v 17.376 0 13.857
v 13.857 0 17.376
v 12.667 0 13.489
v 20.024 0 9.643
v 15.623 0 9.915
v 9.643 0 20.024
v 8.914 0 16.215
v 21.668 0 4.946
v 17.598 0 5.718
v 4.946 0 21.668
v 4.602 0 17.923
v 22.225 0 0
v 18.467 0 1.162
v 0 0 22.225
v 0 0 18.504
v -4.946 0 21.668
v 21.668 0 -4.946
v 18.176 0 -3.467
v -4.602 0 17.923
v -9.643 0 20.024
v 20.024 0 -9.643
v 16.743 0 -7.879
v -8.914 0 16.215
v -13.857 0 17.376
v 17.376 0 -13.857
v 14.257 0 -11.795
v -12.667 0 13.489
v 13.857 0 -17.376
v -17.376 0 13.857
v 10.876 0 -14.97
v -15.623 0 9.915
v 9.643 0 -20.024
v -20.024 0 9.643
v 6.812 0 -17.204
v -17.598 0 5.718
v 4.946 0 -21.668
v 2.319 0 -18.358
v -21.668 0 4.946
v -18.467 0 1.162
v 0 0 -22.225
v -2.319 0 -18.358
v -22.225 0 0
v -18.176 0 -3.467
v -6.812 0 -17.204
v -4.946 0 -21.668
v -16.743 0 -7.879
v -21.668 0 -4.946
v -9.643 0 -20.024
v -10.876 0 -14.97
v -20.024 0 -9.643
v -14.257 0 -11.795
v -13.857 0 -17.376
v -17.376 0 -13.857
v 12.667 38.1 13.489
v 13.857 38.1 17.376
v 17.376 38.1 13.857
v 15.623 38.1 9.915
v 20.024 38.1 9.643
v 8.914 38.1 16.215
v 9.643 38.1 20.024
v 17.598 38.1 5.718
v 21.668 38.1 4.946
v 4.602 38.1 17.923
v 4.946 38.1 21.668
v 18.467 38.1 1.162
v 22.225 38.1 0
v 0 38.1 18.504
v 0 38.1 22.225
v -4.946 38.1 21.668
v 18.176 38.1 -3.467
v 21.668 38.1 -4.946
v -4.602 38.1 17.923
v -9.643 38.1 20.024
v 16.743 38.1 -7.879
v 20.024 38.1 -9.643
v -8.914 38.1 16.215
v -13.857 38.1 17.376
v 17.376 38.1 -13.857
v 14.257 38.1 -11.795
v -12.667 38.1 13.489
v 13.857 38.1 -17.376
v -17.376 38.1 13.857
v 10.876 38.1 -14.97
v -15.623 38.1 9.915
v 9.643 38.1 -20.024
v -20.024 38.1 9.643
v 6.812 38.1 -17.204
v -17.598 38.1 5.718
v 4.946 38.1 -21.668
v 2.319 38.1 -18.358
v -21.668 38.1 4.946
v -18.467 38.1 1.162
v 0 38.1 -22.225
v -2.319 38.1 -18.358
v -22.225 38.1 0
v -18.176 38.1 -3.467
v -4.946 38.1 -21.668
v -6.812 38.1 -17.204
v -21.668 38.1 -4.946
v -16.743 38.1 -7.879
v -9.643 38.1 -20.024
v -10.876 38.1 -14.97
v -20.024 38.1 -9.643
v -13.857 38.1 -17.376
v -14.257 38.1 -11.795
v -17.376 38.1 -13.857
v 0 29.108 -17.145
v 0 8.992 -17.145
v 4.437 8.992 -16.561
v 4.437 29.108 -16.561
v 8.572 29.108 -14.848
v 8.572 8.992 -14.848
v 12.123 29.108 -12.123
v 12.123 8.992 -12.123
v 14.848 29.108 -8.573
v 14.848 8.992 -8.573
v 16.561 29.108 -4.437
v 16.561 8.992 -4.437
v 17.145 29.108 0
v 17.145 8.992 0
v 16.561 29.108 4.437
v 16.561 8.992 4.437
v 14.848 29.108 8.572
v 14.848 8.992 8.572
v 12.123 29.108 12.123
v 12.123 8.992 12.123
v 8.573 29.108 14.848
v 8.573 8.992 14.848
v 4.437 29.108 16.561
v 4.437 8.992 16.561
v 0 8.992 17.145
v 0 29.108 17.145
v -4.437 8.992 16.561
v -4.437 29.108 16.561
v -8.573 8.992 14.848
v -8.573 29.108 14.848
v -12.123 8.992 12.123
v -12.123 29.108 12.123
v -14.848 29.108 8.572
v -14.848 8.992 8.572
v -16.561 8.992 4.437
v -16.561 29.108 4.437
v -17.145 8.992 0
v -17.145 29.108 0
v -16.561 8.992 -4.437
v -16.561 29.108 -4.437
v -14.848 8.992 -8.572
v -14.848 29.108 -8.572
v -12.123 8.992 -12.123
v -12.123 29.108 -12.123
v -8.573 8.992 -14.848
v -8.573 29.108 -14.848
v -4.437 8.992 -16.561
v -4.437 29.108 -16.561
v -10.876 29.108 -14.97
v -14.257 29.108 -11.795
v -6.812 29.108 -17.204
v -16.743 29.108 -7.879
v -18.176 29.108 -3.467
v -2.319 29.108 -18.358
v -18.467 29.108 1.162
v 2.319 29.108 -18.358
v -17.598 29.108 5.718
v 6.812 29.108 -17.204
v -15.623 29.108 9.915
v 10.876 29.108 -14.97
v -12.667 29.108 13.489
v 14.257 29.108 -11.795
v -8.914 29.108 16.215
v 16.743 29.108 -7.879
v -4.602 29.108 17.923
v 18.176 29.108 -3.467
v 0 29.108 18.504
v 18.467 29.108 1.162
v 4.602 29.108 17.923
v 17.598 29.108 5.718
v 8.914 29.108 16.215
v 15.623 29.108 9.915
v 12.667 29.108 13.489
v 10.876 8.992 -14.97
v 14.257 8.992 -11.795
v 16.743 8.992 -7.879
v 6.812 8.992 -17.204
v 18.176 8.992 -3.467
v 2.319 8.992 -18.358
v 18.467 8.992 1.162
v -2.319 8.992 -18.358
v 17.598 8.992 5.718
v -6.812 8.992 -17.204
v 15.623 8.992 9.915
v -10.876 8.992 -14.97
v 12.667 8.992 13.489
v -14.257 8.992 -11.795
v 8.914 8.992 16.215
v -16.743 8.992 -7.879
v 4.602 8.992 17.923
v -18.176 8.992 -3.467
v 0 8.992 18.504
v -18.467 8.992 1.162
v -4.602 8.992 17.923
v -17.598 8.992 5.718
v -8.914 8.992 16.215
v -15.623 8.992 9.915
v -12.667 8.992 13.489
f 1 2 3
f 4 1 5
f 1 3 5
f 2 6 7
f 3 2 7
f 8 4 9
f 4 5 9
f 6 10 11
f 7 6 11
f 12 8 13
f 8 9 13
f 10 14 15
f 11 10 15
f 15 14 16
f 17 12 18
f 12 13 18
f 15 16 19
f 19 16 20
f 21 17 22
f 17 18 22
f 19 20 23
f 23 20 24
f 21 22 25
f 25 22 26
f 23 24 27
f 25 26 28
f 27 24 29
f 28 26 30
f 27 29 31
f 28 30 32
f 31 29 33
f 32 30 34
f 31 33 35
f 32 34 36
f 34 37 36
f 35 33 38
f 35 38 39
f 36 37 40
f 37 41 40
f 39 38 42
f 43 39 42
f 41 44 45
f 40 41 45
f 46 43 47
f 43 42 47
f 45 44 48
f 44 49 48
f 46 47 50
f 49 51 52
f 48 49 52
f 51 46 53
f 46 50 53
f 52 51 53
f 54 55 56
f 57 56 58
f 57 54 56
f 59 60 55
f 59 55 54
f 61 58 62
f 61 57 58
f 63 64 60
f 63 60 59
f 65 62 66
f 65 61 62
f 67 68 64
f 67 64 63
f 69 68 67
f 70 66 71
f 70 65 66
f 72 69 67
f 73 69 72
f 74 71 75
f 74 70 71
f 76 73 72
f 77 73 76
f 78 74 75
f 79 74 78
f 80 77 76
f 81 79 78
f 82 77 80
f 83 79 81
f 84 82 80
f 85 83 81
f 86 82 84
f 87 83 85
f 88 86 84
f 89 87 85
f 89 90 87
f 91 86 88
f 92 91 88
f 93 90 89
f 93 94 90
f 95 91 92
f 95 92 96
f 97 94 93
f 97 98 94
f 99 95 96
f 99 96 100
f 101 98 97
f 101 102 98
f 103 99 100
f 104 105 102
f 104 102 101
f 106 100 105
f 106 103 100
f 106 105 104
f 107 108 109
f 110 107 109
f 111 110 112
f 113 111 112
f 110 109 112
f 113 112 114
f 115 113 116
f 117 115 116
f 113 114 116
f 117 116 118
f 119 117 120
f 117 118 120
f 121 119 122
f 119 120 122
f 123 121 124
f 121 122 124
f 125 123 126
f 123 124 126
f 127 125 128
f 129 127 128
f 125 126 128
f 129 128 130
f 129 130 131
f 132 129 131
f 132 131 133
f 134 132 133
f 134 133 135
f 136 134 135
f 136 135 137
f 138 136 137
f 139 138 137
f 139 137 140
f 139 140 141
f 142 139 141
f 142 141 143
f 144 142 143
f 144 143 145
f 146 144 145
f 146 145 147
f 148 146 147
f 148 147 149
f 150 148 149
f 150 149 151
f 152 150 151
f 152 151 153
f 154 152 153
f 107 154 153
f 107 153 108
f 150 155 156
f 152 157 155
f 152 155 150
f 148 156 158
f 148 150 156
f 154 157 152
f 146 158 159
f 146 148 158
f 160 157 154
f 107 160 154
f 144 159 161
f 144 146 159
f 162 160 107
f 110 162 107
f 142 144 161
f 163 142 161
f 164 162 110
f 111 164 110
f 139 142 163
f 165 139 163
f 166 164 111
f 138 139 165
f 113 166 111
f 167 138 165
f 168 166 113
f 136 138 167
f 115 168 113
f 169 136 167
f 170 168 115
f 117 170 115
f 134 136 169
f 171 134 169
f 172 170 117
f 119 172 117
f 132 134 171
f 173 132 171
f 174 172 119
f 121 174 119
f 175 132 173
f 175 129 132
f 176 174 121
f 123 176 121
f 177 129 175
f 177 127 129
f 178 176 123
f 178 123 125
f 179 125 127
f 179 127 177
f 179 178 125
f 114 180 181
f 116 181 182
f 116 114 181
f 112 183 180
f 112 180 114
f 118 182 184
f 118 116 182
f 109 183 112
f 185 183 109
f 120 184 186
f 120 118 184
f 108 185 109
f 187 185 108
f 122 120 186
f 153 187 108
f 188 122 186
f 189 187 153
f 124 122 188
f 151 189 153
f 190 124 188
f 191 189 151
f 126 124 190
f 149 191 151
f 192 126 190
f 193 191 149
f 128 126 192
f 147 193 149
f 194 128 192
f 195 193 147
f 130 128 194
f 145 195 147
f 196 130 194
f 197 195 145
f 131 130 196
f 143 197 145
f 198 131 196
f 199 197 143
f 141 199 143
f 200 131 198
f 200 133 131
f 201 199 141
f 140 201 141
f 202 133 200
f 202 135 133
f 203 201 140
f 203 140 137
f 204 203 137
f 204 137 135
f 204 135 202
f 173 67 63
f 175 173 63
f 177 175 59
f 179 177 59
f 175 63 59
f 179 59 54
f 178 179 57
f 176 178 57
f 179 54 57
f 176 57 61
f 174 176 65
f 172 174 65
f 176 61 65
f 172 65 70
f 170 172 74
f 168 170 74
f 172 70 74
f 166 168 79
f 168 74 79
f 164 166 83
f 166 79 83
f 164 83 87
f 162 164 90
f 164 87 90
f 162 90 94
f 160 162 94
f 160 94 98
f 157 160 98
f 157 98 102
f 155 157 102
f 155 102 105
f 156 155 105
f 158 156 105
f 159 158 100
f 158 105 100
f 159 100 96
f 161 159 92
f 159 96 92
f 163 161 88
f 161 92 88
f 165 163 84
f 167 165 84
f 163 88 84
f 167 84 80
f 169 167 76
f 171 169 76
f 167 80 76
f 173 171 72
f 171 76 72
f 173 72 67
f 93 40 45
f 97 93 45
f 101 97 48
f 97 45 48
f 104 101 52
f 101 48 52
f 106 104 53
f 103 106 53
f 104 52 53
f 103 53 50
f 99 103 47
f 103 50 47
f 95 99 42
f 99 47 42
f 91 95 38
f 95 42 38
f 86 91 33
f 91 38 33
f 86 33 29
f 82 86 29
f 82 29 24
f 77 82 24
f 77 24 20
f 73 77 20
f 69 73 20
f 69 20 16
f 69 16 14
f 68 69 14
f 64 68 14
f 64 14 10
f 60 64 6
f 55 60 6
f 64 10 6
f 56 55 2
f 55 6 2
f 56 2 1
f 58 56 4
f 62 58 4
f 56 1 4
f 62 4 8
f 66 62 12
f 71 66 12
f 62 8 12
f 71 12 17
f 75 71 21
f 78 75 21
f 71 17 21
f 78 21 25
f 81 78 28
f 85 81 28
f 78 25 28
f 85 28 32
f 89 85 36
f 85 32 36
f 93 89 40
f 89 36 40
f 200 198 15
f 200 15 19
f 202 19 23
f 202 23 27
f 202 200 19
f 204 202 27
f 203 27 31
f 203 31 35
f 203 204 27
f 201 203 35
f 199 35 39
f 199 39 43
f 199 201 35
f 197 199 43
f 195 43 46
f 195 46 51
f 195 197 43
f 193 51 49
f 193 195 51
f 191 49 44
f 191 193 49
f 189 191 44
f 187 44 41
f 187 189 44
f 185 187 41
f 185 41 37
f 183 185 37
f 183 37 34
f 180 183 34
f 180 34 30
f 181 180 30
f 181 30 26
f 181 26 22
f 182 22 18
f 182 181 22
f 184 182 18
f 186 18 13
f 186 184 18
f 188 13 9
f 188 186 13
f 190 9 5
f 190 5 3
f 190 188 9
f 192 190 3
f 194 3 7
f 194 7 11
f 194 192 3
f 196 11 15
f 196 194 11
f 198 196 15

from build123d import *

# Parameters (mm, degrees)
SKETCH1_R           = 22.225
BOSS_EXTRUDE1_DEPTH = 38.1
SKETCH2_R           = 18.5039
CUT_EXTRUDE1_DEPTH  = 8.9916
CUT_EXTRUDE2_START  = -8.9916
SKETCH4_R           = 18.5039
CUT_EXTRUDE2_DEPTH  = 8.9916
SKETCH5_R           = 17.145
CUT_EXTRUDE3_DEPTH  = 43.839236694


with BuildPart() as part:
    # Sketch1 → Boss-Extrude1 (new body)
    with BuildSketch(Plane(origin=(0, 0, 0), x_dir=(1, 0, 0), z_dir=(0, 1, 0))):
        with Locations(Location((0, 0, 0), (0, 0, 90))):
            Circle(SKETCH1_R)
    extrude(amount=BOSS_EXTRUDE1_DEPTH)

    # Sketch2 → Cut-Extrude1 (cut)
    with BuildSketch(Plane(origin=(0, 38.1, 0), x_dir=(1, 0, 0), z_dir=(0, 1, 0))):
        with Locations(Location((0, 0, 0), (0, 0, 270))):
            Circle(SKETCH2_R)
    extrude(amount=-CUT_EXTRUDE1_DEPTH, mode=Mode.SUBTRACT)

    # Sketch4 → Cut-Extrude2 (cut)
    with BuildSketch(Plane.XZ.offset(CUT_EXTRUDE2_START)):
        with Locations(Location((0, 0, 0), (0, 0, 90))):
            Circle(SKETCH4_R)
    extrude(amount=CUT_EXTRUDE2_DEPTH, mode=Mode.SUBTRACT)

    # Sketch5 → Cut-Extrude3 (cut, through all)
    with BuildSketch(Plane.XZ.offset(-8.9916)):
        with Locations(Location((0, 0, 0), (0, 0, 270))):
            Circle(SKETCH5_R)
    extrude(amount=-CUT_EXTRUDE3_DEPTH, mode=Mode.SUBTRACT)


solid = part.part
